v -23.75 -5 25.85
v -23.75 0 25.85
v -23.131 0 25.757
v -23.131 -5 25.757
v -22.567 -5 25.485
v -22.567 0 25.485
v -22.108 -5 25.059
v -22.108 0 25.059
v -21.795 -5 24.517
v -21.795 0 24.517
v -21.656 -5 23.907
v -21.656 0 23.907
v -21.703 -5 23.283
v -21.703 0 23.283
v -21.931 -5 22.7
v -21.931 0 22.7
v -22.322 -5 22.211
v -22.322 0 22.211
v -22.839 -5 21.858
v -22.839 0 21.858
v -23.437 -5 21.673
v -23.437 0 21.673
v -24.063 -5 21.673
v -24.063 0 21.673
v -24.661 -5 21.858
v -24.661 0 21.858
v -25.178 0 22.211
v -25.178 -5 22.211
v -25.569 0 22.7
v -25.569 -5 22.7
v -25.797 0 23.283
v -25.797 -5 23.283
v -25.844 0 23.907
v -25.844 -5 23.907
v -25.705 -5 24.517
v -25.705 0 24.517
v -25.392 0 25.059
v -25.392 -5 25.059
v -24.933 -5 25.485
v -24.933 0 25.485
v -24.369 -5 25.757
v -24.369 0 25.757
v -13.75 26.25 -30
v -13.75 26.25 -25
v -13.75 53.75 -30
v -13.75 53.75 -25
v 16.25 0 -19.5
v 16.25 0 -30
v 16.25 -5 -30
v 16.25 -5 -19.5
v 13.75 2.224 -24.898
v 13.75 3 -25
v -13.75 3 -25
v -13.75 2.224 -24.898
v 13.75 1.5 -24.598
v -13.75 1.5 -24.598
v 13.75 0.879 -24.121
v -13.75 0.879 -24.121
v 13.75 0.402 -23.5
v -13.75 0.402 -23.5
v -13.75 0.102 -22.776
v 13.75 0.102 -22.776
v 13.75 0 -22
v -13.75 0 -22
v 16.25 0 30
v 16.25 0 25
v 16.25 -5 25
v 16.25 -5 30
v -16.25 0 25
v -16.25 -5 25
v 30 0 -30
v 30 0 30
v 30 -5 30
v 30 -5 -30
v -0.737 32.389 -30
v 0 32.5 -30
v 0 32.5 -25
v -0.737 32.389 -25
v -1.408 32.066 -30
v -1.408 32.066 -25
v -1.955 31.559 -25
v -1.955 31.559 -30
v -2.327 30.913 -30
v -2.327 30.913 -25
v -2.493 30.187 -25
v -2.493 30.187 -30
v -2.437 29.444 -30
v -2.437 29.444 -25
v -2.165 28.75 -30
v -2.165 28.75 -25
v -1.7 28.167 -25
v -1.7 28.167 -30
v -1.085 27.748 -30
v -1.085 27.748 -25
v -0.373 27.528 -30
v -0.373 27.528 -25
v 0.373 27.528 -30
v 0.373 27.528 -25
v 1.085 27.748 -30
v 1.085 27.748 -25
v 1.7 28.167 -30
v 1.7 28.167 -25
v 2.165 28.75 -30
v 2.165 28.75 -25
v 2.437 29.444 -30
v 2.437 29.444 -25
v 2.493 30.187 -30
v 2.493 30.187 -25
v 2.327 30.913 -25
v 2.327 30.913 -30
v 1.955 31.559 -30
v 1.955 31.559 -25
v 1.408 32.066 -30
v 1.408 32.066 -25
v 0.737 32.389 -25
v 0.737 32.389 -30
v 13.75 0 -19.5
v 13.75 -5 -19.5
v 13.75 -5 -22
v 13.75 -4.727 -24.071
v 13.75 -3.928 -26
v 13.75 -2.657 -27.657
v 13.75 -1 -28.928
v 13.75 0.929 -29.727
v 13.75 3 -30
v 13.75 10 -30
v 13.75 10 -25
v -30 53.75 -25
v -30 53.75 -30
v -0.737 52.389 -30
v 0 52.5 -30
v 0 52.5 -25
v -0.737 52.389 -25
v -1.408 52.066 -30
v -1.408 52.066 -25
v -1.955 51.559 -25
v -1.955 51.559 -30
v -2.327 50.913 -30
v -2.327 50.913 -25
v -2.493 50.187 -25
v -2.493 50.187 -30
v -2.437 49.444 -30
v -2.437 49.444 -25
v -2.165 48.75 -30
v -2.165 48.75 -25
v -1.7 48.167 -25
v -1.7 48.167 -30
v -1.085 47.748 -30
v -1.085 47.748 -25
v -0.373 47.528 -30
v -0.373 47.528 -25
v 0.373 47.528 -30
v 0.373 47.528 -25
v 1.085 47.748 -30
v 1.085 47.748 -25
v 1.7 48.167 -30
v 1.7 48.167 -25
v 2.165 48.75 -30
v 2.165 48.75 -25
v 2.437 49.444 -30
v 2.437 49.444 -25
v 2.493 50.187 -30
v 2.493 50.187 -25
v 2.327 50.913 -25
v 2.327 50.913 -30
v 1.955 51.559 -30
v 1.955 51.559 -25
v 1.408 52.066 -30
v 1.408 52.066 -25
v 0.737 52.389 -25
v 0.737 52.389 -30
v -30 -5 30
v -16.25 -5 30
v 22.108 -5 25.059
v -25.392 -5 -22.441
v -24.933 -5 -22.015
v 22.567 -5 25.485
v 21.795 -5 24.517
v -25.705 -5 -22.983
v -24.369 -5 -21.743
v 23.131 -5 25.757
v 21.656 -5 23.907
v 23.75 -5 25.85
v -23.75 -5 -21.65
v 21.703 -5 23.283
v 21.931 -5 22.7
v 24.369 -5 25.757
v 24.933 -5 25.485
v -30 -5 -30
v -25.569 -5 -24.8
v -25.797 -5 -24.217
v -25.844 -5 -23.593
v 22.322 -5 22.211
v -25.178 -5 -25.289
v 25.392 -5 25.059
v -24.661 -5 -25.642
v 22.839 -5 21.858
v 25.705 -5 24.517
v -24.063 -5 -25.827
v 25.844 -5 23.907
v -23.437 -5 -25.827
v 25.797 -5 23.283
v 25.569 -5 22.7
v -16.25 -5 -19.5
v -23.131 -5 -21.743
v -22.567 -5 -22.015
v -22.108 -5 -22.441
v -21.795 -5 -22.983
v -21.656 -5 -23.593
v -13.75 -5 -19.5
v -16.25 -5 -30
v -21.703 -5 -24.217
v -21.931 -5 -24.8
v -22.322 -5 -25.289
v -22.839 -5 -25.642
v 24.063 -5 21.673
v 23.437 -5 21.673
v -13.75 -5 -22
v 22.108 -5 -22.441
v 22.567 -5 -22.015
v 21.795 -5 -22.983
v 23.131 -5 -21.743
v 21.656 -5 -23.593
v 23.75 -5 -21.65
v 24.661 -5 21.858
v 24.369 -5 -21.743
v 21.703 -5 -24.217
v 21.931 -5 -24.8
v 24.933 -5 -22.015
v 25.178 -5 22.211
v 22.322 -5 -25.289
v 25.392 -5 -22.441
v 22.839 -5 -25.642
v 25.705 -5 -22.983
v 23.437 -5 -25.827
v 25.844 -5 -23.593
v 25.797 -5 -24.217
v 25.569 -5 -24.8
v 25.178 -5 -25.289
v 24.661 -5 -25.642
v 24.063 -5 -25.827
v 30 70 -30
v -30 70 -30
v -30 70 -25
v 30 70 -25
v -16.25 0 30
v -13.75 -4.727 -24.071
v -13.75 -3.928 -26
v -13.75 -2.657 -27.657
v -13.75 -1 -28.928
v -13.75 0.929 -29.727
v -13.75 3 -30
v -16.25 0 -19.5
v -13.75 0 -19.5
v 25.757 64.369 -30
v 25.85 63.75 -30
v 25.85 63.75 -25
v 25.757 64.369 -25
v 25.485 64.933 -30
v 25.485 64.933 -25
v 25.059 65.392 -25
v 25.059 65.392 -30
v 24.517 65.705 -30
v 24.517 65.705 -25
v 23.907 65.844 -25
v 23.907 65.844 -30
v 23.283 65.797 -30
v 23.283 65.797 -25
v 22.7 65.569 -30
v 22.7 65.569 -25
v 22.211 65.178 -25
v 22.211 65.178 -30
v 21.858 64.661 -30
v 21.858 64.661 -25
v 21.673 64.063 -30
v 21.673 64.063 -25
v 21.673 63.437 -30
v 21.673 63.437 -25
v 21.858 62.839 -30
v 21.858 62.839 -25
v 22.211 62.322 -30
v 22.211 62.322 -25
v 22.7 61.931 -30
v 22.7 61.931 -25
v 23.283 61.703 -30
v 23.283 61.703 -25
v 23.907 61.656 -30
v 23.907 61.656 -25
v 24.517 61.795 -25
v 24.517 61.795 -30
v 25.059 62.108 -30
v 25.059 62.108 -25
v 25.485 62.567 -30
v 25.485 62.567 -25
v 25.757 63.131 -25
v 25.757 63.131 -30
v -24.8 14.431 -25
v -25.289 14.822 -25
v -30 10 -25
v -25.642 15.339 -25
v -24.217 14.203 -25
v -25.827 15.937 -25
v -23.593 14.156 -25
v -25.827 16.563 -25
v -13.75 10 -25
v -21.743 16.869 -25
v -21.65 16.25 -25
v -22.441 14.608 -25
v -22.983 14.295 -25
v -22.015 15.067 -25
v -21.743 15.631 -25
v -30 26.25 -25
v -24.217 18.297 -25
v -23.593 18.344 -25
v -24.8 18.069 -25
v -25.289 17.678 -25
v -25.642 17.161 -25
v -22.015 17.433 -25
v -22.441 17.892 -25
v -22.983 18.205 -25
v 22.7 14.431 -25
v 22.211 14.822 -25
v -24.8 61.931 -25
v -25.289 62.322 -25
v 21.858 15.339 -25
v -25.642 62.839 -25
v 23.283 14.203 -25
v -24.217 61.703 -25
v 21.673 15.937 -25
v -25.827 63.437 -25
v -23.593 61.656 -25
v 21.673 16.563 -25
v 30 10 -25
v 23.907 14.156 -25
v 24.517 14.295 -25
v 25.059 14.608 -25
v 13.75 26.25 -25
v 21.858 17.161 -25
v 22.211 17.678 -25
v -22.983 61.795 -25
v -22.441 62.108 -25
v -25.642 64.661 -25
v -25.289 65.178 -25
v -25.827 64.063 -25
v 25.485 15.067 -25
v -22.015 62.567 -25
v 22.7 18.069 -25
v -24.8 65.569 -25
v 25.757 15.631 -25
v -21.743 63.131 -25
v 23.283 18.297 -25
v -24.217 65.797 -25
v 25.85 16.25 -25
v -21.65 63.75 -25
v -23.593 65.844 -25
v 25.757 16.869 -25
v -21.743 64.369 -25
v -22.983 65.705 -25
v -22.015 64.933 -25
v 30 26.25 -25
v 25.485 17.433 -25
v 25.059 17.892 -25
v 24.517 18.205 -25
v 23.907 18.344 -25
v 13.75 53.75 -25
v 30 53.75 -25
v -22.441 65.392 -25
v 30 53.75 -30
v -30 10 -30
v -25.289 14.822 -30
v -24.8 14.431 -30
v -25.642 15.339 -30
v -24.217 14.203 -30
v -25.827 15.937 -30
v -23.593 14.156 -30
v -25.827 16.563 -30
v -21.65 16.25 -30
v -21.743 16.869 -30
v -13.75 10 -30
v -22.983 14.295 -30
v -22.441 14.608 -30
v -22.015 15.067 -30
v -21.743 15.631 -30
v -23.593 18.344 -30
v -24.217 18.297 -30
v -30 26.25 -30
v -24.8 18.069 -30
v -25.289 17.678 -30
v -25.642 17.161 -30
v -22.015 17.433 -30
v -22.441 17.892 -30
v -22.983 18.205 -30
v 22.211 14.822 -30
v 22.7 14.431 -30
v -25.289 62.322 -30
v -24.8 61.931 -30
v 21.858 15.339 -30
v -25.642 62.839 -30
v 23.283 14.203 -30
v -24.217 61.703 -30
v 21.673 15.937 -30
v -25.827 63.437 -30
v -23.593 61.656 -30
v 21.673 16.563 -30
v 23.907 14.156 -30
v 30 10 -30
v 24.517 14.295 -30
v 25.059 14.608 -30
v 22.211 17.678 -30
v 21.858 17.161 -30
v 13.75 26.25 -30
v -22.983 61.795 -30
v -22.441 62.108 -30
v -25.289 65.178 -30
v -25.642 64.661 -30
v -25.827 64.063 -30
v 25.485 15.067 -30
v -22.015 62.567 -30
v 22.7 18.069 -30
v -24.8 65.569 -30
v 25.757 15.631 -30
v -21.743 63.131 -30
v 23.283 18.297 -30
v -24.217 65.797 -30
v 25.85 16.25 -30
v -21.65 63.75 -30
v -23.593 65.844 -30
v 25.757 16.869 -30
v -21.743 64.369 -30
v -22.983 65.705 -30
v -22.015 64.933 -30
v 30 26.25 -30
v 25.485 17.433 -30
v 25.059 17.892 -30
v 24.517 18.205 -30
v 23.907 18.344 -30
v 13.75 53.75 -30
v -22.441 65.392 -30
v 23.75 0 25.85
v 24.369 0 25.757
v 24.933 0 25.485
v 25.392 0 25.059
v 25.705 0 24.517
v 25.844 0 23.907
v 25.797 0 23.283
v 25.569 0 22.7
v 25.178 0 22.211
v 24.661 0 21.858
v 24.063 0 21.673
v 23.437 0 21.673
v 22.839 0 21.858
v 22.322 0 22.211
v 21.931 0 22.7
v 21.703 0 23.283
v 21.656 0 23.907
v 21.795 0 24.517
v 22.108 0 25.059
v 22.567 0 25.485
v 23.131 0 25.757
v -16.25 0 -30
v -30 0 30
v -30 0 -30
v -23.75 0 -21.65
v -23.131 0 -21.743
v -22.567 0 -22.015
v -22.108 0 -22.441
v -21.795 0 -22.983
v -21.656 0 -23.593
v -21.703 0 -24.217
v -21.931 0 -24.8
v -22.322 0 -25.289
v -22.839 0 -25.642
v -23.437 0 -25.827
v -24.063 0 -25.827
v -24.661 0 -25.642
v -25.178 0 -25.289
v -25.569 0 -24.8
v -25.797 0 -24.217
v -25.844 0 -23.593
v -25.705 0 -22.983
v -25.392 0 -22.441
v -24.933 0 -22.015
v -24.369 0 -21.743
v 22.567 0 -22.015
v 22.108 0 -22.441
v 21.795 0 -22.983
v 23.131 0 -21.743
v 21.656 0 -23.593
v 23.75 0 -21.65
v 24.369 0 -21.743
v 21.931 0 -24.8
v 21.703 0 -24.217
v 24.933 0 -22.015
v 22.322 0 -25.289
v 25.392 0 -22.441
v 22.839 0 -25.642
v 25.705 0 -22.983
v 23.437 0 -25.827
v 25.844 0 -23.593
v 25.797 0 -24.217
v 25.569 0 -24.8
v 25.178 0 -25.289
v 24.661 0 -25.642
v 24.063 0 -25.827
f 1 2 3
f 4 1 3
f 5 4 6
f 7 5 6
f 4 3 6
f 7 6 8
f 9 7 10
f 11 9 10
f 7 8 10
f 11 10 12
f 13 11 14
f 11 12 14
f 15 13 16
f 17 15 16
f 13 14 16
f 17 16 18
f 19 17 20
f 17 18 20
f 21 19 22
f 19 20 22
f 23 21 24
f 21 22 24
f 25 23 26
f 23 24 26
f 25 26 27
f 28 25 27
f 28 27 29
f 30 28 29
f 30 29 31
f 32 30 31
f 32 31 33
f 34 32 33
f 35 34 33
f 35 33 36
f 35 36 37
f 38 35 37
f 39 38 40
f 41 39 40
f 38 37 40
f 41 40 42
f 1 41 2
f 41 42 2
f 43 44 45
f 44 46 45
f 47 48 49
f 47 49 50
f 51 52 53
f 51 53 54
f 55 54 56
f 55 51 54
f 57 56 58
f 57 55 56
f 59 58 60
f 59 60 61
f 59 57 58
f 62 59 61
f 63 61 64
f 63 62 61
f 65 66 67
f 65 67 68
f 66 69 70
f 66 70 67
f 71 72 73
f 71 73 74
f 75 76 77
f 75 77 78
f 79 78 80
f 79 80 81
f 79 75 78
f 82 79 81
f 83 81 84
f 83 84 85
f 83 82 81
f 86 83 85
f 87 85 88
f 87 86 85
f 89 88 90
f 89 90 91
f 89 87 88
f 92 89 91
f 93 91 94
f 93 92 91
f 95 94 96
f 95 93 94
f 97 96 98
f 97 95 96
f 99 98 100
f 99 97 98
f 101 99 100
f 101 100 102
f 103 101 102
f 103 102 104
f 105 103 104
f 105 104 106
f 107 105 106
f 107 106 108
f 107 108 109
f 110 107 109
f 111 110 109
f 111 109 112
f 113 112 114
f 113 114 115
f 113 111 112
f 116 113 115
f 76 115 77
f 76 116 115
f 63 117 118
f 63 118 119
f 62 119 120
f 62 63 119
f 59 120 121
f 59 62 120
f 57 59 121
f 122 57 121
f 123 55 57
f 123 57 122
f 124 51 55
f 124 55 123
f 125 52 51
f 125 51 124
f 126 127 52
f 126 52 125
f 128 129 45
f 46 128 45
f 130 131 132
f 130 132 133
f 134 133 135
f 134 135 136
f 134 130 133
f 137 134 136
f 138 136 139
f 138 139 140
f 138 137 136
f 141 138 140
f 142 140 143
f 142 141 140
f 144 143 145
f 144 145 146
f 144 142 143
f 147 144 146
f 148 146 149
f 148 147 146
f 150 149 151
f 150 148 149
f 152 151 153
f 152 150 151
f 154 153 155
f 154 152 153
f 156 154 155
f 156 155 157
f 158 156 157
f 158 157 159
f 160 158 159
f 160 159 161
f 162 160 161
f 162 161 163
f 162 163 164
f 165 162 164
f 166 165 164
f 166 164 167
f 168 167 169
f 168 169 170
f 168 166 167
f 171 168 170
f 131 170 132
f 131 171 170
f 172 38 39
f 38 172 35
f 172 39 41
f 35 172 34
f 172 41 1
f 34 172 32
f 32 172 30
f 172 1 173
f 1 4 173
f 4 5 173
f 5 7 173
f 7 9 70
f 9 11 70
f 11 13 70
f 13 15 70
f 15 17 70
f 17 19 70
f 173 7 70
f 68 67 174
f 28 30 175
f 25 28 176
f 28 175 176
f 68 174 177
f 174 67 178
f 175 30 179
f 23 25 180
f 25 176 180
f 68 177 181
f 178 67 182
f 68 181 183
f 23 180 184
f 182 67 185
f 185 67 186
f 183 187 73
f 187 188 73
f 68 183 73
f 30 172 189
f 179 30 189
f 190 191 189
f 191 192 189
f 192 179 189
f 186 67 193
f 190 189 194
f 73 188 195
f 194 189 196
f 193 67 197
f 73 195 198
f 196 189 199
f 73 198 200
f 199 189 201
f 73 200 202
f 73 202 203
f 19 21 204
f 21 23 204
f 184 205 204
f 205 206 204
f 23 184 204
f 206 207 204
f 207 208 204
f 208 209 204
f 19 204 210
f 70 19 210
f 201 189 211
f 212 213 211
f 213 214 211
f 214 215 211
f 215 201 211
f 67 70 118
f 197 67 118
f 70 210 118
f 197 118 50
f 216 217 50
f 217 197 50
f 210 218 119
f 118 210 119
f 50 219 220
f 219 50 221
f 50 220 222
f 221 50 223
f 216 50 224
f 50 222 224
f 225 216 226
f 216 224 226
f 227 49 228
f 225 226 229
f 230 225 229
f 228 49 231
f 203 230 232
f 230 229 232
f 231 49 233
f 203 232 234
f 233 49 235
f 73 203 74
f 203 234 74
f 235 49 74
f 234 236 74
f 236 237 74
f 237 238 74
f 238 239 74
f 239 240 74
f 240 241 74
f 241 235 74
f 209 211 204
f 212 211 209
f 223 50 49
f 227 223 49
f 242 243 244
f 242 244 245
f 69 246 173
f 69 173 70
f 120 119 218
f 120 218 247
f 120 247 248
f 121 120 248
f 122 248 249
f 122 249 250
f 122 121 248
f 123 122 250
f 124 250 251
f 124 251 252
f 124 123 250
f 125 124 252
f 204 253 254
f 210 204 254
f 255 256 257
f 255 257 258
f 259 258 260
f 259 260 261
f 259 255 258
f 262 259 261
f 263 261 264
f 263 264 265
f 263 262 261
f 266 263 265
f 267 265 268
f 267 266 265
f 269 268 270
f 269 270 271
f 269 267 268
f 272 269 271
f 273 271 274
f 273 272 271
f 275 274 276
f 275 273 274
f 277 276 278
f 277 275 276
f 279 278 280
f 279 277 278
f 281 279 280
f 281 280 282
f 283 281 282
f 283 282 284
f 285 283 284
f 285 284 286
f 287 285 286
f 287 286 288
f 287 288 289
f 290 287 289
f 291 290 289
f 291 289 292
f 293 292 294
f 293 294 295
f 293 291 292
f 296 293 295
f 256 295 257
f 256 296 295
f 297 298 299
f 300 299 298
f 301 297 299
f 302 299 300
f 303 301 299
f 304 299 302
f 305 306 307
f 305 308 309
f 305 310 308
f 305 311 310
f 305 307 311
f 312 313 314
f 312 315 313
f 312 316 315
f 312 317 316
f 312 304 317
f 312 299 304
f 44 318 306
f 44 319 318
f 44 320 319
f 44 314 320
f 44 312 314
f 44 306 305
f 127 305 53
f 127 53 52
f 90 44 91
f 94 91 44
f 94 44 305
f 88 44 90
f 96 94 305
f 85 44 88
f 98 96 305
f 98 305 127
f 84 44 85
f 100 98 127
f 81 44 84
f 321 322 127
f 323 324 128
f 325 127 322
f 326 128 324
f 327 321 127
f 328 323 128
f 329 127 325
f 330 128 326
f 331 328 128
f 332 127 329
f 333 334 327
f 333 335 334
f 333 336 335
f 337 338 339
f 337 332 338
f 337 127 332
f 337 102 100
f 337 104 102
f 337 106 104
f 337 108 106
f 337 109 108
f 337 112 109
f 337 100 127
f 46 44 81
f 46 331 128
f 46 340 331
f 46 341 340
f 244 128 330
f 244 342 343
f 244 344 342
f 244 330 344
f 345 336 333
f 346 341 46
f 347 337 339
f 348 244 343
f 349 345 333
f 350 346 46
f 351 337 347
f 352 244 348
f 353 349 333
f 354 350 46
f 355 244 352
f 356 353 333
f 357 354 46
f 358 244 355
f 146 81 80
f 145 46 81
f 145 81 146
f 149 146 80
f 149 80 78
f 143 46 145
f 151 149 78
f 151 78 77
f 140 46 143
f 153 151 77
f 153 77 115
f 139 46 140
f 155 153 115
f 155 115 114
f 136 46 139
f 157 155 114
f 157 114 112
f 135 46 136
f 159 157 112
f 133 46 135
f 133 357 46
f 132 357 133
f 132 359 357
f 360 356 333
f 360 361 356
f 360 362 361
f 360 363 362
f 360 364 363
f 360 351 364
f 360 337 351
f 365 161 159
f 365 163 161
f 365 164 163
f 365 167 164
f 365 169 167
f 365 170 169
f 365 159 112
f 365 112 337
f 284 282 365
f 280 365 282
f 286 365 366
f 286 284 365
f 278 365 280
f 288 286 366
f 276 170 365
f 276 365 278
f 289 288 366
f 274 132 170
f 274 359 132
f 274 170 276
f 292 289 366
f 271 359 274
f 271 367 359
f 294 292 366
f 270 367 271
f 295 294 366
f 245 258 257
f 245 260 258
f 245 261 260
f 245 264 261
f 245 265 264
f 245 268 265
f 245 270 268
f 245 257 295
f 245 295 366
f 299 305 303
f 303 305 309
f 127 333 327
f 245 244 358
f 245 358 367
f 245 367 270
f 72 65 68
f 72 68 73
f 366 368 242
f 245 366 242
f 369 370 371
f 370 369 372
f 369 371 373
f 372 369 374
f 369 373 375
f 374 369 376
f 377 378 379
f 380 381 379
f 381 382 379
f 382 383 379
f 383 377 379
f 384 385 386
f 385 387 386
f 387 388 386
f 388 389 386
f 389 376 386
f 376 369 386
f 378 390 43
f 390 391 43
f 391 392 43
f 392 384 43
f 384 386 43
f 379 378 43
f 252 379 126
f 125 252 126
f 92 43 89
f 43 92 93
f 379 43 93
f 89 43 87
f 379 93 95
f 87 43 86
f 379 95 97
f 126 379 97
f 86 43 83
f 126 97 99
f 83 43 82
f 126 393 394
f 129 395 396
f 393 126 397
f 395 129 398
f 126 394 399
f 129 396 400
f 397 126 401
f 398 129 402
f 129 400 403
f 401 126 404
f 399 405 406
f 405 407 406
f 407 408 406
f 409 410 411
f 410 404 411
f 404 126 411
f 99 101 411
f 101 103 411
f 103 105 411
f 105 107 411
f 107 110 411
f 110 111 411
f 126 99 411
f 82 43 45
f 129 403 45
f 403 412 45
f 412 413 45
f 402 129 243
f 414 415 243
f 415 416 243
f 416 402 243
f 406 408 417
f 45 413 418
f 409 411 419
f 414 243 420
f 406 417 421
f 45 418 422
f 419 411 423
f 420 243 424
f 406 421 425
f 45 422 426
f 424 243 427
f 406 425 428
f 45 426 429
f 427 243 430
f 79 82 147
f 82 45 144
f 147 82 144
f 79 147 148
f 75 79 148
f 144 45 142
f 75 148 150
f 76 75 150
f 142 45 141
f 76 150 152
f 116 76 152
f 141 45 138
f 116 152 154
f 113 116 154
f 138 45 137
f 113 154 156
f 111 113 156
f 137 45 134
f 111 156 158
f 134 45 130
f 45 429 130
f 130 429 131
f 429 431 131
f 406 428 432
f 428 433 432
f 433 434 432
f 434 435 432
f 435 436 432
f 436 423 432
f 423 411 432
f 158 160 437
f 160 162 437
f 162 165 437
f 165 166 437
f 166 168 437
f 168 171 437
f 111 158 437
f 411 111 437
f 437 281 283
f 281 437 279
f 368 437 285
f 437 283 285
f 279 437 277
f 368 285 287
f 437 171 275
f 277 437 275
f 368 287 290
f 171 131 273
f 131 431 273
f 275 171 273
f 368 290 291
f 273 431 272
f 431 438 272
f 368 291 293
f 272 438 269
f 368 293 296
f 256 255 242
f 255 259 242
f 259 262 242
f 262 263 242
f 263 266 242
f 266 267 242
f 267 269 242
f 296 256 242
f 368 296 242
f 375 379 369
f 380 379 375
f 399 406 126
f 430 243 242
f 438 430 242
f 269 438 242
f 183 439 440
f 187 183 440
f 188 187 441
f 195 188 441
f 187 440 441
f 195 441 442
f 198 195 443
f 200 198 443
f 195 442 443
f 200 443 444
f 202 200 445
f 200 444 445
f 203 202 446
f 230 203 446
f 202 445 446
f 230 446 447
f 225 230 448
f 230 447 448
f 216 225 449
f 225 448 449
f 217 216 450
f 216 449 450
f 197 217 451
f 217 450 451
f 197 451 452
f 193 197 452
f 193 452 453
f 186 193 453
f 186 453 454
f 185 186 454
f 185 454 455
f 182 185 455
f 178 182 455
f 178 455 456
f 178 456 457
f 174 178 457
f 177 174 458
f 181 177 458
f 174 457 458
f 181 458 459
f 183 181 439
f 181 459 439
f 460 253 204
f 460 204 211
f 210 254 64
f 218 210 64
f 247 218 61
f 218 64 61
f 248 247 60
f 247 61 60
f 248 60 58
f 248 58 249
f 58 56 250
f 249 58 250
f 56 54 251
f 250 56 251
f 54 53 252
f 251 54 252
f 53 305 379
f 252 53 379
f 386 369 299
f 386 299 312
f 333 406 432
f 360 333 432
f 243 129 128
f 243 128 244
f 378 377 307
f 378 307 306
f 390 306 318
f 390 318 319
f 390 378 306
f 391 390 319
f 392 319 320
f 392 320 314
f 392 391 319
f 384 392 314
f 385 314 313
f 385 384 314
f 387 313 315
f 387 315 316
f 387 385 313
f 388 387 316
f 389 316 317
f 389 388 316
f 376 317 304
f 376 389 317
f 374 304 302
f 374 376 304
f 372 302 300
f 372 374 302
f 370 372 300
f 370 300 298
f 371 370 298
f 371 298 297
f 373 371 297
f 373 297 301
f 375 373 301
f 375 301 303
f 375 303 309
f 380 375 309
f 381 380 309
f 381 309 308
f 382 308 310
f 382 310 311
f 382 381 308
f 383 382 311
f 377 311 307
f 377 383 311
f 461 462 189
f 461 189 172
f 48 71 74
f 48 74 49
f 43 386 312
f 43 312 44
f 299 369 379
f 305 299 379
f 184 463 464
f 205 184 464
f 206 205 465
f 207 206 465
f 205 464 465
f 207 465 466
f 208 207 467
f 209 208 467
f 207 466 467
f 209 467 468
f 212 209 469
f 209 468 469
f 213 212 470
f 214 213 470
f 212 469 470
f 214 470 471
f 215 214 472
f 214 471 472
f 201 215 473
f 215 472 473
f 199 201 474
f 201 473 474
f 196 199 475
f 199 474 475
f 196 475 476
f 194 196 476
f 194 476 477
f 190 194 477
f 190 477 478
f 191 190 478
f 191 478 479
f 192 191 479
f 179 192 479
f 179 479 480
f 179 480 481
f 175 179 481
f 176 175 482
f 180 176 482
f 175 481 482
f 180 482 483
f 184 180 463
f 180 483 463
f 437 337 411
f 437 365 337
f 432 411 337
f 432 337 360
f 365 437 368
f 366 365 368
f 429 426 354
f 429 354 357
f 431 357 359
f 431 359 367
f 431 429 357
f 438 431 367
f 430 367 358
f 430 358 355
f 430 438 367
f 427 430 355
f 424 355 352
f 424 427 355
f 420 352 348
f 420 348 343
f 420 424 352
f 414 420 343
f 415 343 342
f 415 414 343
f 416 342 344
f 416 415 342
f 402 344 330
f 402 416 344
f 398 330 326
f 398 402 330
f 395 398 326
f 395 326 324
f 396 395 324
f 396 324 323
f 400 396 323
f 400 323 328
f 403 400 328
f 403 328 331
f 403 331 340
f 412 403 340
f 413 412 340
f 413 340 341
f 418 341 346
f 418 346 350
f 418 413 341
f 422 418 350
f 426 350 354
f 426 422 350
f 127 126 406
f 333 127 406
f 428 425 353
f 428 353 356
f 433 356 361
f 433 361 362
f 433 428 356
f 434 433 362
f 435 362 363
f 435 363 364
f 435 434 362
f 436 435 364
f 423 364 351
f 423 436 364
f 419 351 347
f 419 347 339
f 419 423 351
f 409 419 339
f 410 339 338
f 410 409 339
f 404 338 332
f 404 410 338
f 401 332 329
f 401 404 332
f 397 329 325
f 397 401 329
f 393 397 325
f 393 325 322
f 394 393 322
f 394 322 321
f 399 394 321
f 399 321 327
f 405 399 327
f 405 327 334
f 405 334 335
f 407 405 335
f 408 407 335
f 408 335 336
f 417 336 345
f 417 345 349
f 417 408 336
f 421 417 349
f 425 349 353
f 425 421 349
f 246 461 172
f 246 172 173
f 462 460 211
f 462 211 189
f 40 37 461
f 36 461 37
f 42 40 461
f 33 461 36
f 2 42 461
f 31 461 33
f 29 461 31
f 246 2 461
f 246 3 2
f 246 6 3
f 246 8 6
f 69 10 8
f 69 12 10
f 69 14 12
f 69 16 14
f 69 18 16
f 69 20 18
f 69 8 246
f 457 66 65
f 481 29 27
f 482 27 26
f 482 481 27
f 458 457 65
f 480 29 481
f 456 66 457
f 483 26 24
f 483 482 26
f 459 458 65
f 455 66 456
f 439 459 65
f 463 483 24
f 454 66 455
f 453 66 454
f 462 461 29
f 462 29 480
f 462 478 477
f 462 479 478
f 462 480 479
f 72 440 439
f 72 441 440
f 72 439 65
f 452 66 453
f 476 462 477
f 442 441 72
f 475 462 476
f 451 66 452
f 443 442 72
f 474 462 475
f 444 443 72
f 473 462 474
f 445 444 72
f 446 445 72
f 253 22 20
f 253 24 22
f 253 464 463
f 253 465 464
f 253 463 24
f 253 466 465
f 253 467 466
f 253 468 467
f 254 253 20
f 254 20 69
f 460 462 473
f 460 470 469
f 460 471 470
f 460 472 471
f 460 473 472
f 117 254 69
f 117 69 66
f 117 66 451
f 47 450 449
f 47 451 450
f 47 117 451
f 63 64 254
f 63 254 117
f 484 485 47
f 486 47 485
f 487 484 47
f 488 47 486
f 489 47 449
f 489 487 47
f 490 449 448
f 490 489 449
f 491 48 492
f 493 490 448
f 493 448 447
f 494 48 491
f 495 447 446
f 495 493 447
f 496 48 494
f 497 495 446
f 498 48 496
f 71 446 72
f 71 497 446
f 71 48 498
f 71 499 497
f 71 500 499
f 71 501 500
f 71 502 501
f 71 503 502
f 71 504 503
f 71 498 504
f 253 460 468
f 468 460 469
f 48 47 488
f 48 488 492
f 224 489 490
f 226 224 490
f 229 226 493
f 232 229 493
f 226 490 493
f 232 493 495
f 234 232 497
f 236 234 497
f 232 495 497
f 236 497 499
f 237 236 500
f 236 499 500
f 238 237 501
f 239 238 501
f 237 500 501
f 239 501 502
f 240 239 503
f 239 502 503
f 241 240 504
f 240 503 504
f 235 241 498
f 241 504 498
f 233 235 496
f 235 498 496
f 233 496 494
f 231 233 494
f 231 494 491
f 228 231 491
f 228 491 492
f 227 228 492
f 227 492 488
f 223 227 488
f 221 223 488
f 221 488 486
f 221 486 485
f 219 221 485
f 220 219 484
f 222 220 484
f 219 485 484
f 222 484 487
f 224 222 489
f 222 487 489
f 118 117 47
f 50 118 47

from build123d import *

# Parameters (mm, degrees)
SKETCH_1_R                        = 2.1
SM_BASE_FLANGE_1_DEPTH            = 5
SM_EDGE_FLANGE_1_STRIP_W          = 26
SM_EDGE_FLANGE_1_STRIP_H          = 5
SM_EDGE_FLANGE_1_STRIP_CUT_DEPTH  = 27.5
SM_EDGE_FLANGE_1_RELIEF_W         = 28.5
SM_EDGE_FLANGE_1_RELIEF_H         = 2.5
SM_EDGE_FLANGE_1_RELIEF_CUT_DEPTH = 5
SM_EDGE_FLANGE_1_DEPTH            = 27.5
EXTRUDE_START                     = -30
SKETCH_9_W                        = 16.25
SKETCH_9_H                        = 16.25
EXTRUDE_1_DEPTH                   = 5
CUT_EXTRUDE_START                 = -30
SKETCH_10_R                       = 2.5
CUT_EXTRUDE_1_DEPTH               = 5
SKETCH_11_R                       = 2.1
CUT_EXTRUDE_2_DEPTH               = 5


# Sheet-metal steps are written as plain solids
with BuildPart() as part:
    # Sketch 1 → 基体-法兰1 (new body)
    with BuildSketch(Plane(origin=(0, 0, 0), x_dir=(1, 0, 0), z_dir=(0, 1, 0))):
        Polygon((-16.25, 25), (-16.25, 30), (-30, 30), (-30, -30), (-16.25, -30), (-16.25, -25), (16.25, -25), (16.25, -30), (30, -30), (30, 30), (16.25, 30), (16.25, 25), align=None)
        with Locations(Location((-23.75, 23.75, 0), (0, 0, 270))):
            Circle(SKETCH_1_R, mode=Mode.SUBTRACT)
        with Locations(Location((23.75, 23.75, 0), (0, 0, 270))):
            Circle(SKETCH_1_R, mode=Mode.SUBTRACT)
        with Locations(Location((-23.75, -23.75, 0), (0, 0, 270))):
            Circle(SKETCH_1_R, mode=Mode.SUBTRACT)
        with Locations(Location((23.75, -23.75, 0), (0, 0, 270))):
            Circle(SKETCH_1_R, mode=Mode.SUBTRACT)
    extrude(amount=-SM_BASE_FLANGE_1_DEPTH)

    # 边线-法兰1 strip (across the edge) → 边线-法兰1 strip cut (cut)
    with BuildSketch(Plane(origin=(13.75, 0, -25), x_dir=(0, 0, 1), z_dir=(-1, 0, 0))):
        with Locations((-10, -2.5)):
            Rectangle(SM_EDGE_FLANGE_1_STRIP_W, SM_EDGE_FLANGE_1_STRIP_H)
    extrude(amount=SM_EDGE_FLANGE_1_STRIP_CUT_DEPTH, mode=Mode.SUBTRACT)

    # 边线-法兰1 relief (on the sheet) → 边线-法兰1 relief cut (cut)
    with BuildSketch(Plane(origin=(13.75, 0, -22), x_dir=(0, 0, 1), z_dir=(0, 1, 0))):
        with Locations((-11.75, 1.25)):
            Rectangle(SM_EDGE_FLANGE_1_RELIEF_W, SM_EDGE_FLANGE_1_RELIEF_H)
        with Locations((-11.75, -28.75)):
            Rectangle(SM_EDGE_FLANGE_1_RELIEF_W, SM_EDGE_FLANGE_1_RELIEF_H)
    extrude(amount=-SM_EDGE_FLANGE_1_RELIEF_CUT_DEPTH, mode=Mode.SUBTRACT)

    # 边线-法兰1 section (across the edge) → 边线-法兰1 (add)
    with BuildSketch(Plane(origin=(13.75, 0, -25), x_dir=(0, 0, 1), z_dir=(-1, 0, 0))):
        with BuildLine():
            Line((-5, 3), (-5, 70))
            Line((-5, 70), (0, 70))
            Line((0, 70), (0, 3))
            ThreePointArc((0, 3), (0.878679656, 0.878679656), (3, 0))
            Line((3, 0), (3, -5))
            ThreePointArc((3, -5), (-2.656854249, -2.656854249), (-5, 3))
        make_face()
    extrude(amount=SM_EDGE_FLANGE_1_DEPTH)

    # 草图9 → 凸台-拉伸1 (add)
    with BuildSketch(Plane.XY.offset(EXTRUDE_START)):
        with Locations((-21.875, 61.875)):
            Rectangle(SKETCH_9_W, SKETCH_9_H)
        with Locations((21.875, 61.875)):
            Rectangle(SKETCH_9_W, SKETCH_9_H)
        with Locations((-21.875, 18.125)):
            Rectangle(SKETCH_9_W, SKETCH_9_H)
        with Locations((21.875, 18.125)):
            Rectangle(SKETCH_9_W, SKETCH_9_H)
    extrude(amount=EXTRUDE_1_DEPTH)

    # 草图10 → 切除-拉伸1 (cut)
    with BuildSketch(Plane.XY.offset(CUT_EXTRUDE_START)):
        with Locations(Location((0, 50, 0), (0, 0, 90))):
            Circle(SKETCH_10_R)
        with Locations(Location((0, 30, 0), (0, 0, 90))):
            Circle(SKETCH_10_R)
    extrude(amount=CUT_EXTRUDE_1_DEPTH, mode=Mode.SUBTRACT)

    # 草图11 → 切除-拉伸2 (cut)
    with BuildSketch(Plane.XY.offset(CUT_EXTRUDE_START)):
        with Locations((-23.75, 16.25)):
            Circle(SKETCH_11_R)
        with Locations((-23.75, 63.75)):
            Circle(SKETCH_11_R)
        with Locations((23.75, 63.75)):
            Circle(SKETCH_11_R)
        with Locations((23.75, 16.25)):
            Circle(SKETCH_11_R)
    extrude(amount=CUT_EXTRUDE_2_DEPTH, mode=Mode.SUBTRACT)


solid = part.part
